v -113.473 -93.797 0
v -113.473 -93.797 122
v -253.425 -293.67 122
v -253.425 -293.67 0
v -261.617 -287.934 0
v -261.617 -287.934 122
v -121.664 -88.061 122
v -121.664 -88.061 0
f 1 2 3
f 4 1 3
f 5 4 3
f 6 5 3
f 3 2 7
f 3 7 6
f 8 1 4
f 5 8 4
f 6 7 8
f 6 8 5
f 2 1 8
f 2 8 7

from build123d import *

# Parameters (mm, degrees)
F0_W     = 244
F0_H     = 122
F1_DEPTH = 10
F2_ANGLE = 90
F3_ANGLE = 125


with BuildPart() as f1:
    # F0 (on Top) → F1 (new body)
    with BuildSketch(Plane.XY):
        with Locations((0.335931778, -17.06091269)):
            Rectangle(F0_W, F0_H)
    extrude(amount=F1_DEPTH)


with BuildPart() as f1_1:
    # F2: moved
    add(f1.part.rotate(Axis((0.335931778, -78.06091269, 0), (1, 0, 0)), F2_ANGLE))


with BuildPart() as f1_2:
    # F3: moved
    add(f1_1.part.rotate(Axis((-121.664068222, -88.06091269, 61), (0, 0, -1)), F3_ANGLE))


solid = f1_2.part
